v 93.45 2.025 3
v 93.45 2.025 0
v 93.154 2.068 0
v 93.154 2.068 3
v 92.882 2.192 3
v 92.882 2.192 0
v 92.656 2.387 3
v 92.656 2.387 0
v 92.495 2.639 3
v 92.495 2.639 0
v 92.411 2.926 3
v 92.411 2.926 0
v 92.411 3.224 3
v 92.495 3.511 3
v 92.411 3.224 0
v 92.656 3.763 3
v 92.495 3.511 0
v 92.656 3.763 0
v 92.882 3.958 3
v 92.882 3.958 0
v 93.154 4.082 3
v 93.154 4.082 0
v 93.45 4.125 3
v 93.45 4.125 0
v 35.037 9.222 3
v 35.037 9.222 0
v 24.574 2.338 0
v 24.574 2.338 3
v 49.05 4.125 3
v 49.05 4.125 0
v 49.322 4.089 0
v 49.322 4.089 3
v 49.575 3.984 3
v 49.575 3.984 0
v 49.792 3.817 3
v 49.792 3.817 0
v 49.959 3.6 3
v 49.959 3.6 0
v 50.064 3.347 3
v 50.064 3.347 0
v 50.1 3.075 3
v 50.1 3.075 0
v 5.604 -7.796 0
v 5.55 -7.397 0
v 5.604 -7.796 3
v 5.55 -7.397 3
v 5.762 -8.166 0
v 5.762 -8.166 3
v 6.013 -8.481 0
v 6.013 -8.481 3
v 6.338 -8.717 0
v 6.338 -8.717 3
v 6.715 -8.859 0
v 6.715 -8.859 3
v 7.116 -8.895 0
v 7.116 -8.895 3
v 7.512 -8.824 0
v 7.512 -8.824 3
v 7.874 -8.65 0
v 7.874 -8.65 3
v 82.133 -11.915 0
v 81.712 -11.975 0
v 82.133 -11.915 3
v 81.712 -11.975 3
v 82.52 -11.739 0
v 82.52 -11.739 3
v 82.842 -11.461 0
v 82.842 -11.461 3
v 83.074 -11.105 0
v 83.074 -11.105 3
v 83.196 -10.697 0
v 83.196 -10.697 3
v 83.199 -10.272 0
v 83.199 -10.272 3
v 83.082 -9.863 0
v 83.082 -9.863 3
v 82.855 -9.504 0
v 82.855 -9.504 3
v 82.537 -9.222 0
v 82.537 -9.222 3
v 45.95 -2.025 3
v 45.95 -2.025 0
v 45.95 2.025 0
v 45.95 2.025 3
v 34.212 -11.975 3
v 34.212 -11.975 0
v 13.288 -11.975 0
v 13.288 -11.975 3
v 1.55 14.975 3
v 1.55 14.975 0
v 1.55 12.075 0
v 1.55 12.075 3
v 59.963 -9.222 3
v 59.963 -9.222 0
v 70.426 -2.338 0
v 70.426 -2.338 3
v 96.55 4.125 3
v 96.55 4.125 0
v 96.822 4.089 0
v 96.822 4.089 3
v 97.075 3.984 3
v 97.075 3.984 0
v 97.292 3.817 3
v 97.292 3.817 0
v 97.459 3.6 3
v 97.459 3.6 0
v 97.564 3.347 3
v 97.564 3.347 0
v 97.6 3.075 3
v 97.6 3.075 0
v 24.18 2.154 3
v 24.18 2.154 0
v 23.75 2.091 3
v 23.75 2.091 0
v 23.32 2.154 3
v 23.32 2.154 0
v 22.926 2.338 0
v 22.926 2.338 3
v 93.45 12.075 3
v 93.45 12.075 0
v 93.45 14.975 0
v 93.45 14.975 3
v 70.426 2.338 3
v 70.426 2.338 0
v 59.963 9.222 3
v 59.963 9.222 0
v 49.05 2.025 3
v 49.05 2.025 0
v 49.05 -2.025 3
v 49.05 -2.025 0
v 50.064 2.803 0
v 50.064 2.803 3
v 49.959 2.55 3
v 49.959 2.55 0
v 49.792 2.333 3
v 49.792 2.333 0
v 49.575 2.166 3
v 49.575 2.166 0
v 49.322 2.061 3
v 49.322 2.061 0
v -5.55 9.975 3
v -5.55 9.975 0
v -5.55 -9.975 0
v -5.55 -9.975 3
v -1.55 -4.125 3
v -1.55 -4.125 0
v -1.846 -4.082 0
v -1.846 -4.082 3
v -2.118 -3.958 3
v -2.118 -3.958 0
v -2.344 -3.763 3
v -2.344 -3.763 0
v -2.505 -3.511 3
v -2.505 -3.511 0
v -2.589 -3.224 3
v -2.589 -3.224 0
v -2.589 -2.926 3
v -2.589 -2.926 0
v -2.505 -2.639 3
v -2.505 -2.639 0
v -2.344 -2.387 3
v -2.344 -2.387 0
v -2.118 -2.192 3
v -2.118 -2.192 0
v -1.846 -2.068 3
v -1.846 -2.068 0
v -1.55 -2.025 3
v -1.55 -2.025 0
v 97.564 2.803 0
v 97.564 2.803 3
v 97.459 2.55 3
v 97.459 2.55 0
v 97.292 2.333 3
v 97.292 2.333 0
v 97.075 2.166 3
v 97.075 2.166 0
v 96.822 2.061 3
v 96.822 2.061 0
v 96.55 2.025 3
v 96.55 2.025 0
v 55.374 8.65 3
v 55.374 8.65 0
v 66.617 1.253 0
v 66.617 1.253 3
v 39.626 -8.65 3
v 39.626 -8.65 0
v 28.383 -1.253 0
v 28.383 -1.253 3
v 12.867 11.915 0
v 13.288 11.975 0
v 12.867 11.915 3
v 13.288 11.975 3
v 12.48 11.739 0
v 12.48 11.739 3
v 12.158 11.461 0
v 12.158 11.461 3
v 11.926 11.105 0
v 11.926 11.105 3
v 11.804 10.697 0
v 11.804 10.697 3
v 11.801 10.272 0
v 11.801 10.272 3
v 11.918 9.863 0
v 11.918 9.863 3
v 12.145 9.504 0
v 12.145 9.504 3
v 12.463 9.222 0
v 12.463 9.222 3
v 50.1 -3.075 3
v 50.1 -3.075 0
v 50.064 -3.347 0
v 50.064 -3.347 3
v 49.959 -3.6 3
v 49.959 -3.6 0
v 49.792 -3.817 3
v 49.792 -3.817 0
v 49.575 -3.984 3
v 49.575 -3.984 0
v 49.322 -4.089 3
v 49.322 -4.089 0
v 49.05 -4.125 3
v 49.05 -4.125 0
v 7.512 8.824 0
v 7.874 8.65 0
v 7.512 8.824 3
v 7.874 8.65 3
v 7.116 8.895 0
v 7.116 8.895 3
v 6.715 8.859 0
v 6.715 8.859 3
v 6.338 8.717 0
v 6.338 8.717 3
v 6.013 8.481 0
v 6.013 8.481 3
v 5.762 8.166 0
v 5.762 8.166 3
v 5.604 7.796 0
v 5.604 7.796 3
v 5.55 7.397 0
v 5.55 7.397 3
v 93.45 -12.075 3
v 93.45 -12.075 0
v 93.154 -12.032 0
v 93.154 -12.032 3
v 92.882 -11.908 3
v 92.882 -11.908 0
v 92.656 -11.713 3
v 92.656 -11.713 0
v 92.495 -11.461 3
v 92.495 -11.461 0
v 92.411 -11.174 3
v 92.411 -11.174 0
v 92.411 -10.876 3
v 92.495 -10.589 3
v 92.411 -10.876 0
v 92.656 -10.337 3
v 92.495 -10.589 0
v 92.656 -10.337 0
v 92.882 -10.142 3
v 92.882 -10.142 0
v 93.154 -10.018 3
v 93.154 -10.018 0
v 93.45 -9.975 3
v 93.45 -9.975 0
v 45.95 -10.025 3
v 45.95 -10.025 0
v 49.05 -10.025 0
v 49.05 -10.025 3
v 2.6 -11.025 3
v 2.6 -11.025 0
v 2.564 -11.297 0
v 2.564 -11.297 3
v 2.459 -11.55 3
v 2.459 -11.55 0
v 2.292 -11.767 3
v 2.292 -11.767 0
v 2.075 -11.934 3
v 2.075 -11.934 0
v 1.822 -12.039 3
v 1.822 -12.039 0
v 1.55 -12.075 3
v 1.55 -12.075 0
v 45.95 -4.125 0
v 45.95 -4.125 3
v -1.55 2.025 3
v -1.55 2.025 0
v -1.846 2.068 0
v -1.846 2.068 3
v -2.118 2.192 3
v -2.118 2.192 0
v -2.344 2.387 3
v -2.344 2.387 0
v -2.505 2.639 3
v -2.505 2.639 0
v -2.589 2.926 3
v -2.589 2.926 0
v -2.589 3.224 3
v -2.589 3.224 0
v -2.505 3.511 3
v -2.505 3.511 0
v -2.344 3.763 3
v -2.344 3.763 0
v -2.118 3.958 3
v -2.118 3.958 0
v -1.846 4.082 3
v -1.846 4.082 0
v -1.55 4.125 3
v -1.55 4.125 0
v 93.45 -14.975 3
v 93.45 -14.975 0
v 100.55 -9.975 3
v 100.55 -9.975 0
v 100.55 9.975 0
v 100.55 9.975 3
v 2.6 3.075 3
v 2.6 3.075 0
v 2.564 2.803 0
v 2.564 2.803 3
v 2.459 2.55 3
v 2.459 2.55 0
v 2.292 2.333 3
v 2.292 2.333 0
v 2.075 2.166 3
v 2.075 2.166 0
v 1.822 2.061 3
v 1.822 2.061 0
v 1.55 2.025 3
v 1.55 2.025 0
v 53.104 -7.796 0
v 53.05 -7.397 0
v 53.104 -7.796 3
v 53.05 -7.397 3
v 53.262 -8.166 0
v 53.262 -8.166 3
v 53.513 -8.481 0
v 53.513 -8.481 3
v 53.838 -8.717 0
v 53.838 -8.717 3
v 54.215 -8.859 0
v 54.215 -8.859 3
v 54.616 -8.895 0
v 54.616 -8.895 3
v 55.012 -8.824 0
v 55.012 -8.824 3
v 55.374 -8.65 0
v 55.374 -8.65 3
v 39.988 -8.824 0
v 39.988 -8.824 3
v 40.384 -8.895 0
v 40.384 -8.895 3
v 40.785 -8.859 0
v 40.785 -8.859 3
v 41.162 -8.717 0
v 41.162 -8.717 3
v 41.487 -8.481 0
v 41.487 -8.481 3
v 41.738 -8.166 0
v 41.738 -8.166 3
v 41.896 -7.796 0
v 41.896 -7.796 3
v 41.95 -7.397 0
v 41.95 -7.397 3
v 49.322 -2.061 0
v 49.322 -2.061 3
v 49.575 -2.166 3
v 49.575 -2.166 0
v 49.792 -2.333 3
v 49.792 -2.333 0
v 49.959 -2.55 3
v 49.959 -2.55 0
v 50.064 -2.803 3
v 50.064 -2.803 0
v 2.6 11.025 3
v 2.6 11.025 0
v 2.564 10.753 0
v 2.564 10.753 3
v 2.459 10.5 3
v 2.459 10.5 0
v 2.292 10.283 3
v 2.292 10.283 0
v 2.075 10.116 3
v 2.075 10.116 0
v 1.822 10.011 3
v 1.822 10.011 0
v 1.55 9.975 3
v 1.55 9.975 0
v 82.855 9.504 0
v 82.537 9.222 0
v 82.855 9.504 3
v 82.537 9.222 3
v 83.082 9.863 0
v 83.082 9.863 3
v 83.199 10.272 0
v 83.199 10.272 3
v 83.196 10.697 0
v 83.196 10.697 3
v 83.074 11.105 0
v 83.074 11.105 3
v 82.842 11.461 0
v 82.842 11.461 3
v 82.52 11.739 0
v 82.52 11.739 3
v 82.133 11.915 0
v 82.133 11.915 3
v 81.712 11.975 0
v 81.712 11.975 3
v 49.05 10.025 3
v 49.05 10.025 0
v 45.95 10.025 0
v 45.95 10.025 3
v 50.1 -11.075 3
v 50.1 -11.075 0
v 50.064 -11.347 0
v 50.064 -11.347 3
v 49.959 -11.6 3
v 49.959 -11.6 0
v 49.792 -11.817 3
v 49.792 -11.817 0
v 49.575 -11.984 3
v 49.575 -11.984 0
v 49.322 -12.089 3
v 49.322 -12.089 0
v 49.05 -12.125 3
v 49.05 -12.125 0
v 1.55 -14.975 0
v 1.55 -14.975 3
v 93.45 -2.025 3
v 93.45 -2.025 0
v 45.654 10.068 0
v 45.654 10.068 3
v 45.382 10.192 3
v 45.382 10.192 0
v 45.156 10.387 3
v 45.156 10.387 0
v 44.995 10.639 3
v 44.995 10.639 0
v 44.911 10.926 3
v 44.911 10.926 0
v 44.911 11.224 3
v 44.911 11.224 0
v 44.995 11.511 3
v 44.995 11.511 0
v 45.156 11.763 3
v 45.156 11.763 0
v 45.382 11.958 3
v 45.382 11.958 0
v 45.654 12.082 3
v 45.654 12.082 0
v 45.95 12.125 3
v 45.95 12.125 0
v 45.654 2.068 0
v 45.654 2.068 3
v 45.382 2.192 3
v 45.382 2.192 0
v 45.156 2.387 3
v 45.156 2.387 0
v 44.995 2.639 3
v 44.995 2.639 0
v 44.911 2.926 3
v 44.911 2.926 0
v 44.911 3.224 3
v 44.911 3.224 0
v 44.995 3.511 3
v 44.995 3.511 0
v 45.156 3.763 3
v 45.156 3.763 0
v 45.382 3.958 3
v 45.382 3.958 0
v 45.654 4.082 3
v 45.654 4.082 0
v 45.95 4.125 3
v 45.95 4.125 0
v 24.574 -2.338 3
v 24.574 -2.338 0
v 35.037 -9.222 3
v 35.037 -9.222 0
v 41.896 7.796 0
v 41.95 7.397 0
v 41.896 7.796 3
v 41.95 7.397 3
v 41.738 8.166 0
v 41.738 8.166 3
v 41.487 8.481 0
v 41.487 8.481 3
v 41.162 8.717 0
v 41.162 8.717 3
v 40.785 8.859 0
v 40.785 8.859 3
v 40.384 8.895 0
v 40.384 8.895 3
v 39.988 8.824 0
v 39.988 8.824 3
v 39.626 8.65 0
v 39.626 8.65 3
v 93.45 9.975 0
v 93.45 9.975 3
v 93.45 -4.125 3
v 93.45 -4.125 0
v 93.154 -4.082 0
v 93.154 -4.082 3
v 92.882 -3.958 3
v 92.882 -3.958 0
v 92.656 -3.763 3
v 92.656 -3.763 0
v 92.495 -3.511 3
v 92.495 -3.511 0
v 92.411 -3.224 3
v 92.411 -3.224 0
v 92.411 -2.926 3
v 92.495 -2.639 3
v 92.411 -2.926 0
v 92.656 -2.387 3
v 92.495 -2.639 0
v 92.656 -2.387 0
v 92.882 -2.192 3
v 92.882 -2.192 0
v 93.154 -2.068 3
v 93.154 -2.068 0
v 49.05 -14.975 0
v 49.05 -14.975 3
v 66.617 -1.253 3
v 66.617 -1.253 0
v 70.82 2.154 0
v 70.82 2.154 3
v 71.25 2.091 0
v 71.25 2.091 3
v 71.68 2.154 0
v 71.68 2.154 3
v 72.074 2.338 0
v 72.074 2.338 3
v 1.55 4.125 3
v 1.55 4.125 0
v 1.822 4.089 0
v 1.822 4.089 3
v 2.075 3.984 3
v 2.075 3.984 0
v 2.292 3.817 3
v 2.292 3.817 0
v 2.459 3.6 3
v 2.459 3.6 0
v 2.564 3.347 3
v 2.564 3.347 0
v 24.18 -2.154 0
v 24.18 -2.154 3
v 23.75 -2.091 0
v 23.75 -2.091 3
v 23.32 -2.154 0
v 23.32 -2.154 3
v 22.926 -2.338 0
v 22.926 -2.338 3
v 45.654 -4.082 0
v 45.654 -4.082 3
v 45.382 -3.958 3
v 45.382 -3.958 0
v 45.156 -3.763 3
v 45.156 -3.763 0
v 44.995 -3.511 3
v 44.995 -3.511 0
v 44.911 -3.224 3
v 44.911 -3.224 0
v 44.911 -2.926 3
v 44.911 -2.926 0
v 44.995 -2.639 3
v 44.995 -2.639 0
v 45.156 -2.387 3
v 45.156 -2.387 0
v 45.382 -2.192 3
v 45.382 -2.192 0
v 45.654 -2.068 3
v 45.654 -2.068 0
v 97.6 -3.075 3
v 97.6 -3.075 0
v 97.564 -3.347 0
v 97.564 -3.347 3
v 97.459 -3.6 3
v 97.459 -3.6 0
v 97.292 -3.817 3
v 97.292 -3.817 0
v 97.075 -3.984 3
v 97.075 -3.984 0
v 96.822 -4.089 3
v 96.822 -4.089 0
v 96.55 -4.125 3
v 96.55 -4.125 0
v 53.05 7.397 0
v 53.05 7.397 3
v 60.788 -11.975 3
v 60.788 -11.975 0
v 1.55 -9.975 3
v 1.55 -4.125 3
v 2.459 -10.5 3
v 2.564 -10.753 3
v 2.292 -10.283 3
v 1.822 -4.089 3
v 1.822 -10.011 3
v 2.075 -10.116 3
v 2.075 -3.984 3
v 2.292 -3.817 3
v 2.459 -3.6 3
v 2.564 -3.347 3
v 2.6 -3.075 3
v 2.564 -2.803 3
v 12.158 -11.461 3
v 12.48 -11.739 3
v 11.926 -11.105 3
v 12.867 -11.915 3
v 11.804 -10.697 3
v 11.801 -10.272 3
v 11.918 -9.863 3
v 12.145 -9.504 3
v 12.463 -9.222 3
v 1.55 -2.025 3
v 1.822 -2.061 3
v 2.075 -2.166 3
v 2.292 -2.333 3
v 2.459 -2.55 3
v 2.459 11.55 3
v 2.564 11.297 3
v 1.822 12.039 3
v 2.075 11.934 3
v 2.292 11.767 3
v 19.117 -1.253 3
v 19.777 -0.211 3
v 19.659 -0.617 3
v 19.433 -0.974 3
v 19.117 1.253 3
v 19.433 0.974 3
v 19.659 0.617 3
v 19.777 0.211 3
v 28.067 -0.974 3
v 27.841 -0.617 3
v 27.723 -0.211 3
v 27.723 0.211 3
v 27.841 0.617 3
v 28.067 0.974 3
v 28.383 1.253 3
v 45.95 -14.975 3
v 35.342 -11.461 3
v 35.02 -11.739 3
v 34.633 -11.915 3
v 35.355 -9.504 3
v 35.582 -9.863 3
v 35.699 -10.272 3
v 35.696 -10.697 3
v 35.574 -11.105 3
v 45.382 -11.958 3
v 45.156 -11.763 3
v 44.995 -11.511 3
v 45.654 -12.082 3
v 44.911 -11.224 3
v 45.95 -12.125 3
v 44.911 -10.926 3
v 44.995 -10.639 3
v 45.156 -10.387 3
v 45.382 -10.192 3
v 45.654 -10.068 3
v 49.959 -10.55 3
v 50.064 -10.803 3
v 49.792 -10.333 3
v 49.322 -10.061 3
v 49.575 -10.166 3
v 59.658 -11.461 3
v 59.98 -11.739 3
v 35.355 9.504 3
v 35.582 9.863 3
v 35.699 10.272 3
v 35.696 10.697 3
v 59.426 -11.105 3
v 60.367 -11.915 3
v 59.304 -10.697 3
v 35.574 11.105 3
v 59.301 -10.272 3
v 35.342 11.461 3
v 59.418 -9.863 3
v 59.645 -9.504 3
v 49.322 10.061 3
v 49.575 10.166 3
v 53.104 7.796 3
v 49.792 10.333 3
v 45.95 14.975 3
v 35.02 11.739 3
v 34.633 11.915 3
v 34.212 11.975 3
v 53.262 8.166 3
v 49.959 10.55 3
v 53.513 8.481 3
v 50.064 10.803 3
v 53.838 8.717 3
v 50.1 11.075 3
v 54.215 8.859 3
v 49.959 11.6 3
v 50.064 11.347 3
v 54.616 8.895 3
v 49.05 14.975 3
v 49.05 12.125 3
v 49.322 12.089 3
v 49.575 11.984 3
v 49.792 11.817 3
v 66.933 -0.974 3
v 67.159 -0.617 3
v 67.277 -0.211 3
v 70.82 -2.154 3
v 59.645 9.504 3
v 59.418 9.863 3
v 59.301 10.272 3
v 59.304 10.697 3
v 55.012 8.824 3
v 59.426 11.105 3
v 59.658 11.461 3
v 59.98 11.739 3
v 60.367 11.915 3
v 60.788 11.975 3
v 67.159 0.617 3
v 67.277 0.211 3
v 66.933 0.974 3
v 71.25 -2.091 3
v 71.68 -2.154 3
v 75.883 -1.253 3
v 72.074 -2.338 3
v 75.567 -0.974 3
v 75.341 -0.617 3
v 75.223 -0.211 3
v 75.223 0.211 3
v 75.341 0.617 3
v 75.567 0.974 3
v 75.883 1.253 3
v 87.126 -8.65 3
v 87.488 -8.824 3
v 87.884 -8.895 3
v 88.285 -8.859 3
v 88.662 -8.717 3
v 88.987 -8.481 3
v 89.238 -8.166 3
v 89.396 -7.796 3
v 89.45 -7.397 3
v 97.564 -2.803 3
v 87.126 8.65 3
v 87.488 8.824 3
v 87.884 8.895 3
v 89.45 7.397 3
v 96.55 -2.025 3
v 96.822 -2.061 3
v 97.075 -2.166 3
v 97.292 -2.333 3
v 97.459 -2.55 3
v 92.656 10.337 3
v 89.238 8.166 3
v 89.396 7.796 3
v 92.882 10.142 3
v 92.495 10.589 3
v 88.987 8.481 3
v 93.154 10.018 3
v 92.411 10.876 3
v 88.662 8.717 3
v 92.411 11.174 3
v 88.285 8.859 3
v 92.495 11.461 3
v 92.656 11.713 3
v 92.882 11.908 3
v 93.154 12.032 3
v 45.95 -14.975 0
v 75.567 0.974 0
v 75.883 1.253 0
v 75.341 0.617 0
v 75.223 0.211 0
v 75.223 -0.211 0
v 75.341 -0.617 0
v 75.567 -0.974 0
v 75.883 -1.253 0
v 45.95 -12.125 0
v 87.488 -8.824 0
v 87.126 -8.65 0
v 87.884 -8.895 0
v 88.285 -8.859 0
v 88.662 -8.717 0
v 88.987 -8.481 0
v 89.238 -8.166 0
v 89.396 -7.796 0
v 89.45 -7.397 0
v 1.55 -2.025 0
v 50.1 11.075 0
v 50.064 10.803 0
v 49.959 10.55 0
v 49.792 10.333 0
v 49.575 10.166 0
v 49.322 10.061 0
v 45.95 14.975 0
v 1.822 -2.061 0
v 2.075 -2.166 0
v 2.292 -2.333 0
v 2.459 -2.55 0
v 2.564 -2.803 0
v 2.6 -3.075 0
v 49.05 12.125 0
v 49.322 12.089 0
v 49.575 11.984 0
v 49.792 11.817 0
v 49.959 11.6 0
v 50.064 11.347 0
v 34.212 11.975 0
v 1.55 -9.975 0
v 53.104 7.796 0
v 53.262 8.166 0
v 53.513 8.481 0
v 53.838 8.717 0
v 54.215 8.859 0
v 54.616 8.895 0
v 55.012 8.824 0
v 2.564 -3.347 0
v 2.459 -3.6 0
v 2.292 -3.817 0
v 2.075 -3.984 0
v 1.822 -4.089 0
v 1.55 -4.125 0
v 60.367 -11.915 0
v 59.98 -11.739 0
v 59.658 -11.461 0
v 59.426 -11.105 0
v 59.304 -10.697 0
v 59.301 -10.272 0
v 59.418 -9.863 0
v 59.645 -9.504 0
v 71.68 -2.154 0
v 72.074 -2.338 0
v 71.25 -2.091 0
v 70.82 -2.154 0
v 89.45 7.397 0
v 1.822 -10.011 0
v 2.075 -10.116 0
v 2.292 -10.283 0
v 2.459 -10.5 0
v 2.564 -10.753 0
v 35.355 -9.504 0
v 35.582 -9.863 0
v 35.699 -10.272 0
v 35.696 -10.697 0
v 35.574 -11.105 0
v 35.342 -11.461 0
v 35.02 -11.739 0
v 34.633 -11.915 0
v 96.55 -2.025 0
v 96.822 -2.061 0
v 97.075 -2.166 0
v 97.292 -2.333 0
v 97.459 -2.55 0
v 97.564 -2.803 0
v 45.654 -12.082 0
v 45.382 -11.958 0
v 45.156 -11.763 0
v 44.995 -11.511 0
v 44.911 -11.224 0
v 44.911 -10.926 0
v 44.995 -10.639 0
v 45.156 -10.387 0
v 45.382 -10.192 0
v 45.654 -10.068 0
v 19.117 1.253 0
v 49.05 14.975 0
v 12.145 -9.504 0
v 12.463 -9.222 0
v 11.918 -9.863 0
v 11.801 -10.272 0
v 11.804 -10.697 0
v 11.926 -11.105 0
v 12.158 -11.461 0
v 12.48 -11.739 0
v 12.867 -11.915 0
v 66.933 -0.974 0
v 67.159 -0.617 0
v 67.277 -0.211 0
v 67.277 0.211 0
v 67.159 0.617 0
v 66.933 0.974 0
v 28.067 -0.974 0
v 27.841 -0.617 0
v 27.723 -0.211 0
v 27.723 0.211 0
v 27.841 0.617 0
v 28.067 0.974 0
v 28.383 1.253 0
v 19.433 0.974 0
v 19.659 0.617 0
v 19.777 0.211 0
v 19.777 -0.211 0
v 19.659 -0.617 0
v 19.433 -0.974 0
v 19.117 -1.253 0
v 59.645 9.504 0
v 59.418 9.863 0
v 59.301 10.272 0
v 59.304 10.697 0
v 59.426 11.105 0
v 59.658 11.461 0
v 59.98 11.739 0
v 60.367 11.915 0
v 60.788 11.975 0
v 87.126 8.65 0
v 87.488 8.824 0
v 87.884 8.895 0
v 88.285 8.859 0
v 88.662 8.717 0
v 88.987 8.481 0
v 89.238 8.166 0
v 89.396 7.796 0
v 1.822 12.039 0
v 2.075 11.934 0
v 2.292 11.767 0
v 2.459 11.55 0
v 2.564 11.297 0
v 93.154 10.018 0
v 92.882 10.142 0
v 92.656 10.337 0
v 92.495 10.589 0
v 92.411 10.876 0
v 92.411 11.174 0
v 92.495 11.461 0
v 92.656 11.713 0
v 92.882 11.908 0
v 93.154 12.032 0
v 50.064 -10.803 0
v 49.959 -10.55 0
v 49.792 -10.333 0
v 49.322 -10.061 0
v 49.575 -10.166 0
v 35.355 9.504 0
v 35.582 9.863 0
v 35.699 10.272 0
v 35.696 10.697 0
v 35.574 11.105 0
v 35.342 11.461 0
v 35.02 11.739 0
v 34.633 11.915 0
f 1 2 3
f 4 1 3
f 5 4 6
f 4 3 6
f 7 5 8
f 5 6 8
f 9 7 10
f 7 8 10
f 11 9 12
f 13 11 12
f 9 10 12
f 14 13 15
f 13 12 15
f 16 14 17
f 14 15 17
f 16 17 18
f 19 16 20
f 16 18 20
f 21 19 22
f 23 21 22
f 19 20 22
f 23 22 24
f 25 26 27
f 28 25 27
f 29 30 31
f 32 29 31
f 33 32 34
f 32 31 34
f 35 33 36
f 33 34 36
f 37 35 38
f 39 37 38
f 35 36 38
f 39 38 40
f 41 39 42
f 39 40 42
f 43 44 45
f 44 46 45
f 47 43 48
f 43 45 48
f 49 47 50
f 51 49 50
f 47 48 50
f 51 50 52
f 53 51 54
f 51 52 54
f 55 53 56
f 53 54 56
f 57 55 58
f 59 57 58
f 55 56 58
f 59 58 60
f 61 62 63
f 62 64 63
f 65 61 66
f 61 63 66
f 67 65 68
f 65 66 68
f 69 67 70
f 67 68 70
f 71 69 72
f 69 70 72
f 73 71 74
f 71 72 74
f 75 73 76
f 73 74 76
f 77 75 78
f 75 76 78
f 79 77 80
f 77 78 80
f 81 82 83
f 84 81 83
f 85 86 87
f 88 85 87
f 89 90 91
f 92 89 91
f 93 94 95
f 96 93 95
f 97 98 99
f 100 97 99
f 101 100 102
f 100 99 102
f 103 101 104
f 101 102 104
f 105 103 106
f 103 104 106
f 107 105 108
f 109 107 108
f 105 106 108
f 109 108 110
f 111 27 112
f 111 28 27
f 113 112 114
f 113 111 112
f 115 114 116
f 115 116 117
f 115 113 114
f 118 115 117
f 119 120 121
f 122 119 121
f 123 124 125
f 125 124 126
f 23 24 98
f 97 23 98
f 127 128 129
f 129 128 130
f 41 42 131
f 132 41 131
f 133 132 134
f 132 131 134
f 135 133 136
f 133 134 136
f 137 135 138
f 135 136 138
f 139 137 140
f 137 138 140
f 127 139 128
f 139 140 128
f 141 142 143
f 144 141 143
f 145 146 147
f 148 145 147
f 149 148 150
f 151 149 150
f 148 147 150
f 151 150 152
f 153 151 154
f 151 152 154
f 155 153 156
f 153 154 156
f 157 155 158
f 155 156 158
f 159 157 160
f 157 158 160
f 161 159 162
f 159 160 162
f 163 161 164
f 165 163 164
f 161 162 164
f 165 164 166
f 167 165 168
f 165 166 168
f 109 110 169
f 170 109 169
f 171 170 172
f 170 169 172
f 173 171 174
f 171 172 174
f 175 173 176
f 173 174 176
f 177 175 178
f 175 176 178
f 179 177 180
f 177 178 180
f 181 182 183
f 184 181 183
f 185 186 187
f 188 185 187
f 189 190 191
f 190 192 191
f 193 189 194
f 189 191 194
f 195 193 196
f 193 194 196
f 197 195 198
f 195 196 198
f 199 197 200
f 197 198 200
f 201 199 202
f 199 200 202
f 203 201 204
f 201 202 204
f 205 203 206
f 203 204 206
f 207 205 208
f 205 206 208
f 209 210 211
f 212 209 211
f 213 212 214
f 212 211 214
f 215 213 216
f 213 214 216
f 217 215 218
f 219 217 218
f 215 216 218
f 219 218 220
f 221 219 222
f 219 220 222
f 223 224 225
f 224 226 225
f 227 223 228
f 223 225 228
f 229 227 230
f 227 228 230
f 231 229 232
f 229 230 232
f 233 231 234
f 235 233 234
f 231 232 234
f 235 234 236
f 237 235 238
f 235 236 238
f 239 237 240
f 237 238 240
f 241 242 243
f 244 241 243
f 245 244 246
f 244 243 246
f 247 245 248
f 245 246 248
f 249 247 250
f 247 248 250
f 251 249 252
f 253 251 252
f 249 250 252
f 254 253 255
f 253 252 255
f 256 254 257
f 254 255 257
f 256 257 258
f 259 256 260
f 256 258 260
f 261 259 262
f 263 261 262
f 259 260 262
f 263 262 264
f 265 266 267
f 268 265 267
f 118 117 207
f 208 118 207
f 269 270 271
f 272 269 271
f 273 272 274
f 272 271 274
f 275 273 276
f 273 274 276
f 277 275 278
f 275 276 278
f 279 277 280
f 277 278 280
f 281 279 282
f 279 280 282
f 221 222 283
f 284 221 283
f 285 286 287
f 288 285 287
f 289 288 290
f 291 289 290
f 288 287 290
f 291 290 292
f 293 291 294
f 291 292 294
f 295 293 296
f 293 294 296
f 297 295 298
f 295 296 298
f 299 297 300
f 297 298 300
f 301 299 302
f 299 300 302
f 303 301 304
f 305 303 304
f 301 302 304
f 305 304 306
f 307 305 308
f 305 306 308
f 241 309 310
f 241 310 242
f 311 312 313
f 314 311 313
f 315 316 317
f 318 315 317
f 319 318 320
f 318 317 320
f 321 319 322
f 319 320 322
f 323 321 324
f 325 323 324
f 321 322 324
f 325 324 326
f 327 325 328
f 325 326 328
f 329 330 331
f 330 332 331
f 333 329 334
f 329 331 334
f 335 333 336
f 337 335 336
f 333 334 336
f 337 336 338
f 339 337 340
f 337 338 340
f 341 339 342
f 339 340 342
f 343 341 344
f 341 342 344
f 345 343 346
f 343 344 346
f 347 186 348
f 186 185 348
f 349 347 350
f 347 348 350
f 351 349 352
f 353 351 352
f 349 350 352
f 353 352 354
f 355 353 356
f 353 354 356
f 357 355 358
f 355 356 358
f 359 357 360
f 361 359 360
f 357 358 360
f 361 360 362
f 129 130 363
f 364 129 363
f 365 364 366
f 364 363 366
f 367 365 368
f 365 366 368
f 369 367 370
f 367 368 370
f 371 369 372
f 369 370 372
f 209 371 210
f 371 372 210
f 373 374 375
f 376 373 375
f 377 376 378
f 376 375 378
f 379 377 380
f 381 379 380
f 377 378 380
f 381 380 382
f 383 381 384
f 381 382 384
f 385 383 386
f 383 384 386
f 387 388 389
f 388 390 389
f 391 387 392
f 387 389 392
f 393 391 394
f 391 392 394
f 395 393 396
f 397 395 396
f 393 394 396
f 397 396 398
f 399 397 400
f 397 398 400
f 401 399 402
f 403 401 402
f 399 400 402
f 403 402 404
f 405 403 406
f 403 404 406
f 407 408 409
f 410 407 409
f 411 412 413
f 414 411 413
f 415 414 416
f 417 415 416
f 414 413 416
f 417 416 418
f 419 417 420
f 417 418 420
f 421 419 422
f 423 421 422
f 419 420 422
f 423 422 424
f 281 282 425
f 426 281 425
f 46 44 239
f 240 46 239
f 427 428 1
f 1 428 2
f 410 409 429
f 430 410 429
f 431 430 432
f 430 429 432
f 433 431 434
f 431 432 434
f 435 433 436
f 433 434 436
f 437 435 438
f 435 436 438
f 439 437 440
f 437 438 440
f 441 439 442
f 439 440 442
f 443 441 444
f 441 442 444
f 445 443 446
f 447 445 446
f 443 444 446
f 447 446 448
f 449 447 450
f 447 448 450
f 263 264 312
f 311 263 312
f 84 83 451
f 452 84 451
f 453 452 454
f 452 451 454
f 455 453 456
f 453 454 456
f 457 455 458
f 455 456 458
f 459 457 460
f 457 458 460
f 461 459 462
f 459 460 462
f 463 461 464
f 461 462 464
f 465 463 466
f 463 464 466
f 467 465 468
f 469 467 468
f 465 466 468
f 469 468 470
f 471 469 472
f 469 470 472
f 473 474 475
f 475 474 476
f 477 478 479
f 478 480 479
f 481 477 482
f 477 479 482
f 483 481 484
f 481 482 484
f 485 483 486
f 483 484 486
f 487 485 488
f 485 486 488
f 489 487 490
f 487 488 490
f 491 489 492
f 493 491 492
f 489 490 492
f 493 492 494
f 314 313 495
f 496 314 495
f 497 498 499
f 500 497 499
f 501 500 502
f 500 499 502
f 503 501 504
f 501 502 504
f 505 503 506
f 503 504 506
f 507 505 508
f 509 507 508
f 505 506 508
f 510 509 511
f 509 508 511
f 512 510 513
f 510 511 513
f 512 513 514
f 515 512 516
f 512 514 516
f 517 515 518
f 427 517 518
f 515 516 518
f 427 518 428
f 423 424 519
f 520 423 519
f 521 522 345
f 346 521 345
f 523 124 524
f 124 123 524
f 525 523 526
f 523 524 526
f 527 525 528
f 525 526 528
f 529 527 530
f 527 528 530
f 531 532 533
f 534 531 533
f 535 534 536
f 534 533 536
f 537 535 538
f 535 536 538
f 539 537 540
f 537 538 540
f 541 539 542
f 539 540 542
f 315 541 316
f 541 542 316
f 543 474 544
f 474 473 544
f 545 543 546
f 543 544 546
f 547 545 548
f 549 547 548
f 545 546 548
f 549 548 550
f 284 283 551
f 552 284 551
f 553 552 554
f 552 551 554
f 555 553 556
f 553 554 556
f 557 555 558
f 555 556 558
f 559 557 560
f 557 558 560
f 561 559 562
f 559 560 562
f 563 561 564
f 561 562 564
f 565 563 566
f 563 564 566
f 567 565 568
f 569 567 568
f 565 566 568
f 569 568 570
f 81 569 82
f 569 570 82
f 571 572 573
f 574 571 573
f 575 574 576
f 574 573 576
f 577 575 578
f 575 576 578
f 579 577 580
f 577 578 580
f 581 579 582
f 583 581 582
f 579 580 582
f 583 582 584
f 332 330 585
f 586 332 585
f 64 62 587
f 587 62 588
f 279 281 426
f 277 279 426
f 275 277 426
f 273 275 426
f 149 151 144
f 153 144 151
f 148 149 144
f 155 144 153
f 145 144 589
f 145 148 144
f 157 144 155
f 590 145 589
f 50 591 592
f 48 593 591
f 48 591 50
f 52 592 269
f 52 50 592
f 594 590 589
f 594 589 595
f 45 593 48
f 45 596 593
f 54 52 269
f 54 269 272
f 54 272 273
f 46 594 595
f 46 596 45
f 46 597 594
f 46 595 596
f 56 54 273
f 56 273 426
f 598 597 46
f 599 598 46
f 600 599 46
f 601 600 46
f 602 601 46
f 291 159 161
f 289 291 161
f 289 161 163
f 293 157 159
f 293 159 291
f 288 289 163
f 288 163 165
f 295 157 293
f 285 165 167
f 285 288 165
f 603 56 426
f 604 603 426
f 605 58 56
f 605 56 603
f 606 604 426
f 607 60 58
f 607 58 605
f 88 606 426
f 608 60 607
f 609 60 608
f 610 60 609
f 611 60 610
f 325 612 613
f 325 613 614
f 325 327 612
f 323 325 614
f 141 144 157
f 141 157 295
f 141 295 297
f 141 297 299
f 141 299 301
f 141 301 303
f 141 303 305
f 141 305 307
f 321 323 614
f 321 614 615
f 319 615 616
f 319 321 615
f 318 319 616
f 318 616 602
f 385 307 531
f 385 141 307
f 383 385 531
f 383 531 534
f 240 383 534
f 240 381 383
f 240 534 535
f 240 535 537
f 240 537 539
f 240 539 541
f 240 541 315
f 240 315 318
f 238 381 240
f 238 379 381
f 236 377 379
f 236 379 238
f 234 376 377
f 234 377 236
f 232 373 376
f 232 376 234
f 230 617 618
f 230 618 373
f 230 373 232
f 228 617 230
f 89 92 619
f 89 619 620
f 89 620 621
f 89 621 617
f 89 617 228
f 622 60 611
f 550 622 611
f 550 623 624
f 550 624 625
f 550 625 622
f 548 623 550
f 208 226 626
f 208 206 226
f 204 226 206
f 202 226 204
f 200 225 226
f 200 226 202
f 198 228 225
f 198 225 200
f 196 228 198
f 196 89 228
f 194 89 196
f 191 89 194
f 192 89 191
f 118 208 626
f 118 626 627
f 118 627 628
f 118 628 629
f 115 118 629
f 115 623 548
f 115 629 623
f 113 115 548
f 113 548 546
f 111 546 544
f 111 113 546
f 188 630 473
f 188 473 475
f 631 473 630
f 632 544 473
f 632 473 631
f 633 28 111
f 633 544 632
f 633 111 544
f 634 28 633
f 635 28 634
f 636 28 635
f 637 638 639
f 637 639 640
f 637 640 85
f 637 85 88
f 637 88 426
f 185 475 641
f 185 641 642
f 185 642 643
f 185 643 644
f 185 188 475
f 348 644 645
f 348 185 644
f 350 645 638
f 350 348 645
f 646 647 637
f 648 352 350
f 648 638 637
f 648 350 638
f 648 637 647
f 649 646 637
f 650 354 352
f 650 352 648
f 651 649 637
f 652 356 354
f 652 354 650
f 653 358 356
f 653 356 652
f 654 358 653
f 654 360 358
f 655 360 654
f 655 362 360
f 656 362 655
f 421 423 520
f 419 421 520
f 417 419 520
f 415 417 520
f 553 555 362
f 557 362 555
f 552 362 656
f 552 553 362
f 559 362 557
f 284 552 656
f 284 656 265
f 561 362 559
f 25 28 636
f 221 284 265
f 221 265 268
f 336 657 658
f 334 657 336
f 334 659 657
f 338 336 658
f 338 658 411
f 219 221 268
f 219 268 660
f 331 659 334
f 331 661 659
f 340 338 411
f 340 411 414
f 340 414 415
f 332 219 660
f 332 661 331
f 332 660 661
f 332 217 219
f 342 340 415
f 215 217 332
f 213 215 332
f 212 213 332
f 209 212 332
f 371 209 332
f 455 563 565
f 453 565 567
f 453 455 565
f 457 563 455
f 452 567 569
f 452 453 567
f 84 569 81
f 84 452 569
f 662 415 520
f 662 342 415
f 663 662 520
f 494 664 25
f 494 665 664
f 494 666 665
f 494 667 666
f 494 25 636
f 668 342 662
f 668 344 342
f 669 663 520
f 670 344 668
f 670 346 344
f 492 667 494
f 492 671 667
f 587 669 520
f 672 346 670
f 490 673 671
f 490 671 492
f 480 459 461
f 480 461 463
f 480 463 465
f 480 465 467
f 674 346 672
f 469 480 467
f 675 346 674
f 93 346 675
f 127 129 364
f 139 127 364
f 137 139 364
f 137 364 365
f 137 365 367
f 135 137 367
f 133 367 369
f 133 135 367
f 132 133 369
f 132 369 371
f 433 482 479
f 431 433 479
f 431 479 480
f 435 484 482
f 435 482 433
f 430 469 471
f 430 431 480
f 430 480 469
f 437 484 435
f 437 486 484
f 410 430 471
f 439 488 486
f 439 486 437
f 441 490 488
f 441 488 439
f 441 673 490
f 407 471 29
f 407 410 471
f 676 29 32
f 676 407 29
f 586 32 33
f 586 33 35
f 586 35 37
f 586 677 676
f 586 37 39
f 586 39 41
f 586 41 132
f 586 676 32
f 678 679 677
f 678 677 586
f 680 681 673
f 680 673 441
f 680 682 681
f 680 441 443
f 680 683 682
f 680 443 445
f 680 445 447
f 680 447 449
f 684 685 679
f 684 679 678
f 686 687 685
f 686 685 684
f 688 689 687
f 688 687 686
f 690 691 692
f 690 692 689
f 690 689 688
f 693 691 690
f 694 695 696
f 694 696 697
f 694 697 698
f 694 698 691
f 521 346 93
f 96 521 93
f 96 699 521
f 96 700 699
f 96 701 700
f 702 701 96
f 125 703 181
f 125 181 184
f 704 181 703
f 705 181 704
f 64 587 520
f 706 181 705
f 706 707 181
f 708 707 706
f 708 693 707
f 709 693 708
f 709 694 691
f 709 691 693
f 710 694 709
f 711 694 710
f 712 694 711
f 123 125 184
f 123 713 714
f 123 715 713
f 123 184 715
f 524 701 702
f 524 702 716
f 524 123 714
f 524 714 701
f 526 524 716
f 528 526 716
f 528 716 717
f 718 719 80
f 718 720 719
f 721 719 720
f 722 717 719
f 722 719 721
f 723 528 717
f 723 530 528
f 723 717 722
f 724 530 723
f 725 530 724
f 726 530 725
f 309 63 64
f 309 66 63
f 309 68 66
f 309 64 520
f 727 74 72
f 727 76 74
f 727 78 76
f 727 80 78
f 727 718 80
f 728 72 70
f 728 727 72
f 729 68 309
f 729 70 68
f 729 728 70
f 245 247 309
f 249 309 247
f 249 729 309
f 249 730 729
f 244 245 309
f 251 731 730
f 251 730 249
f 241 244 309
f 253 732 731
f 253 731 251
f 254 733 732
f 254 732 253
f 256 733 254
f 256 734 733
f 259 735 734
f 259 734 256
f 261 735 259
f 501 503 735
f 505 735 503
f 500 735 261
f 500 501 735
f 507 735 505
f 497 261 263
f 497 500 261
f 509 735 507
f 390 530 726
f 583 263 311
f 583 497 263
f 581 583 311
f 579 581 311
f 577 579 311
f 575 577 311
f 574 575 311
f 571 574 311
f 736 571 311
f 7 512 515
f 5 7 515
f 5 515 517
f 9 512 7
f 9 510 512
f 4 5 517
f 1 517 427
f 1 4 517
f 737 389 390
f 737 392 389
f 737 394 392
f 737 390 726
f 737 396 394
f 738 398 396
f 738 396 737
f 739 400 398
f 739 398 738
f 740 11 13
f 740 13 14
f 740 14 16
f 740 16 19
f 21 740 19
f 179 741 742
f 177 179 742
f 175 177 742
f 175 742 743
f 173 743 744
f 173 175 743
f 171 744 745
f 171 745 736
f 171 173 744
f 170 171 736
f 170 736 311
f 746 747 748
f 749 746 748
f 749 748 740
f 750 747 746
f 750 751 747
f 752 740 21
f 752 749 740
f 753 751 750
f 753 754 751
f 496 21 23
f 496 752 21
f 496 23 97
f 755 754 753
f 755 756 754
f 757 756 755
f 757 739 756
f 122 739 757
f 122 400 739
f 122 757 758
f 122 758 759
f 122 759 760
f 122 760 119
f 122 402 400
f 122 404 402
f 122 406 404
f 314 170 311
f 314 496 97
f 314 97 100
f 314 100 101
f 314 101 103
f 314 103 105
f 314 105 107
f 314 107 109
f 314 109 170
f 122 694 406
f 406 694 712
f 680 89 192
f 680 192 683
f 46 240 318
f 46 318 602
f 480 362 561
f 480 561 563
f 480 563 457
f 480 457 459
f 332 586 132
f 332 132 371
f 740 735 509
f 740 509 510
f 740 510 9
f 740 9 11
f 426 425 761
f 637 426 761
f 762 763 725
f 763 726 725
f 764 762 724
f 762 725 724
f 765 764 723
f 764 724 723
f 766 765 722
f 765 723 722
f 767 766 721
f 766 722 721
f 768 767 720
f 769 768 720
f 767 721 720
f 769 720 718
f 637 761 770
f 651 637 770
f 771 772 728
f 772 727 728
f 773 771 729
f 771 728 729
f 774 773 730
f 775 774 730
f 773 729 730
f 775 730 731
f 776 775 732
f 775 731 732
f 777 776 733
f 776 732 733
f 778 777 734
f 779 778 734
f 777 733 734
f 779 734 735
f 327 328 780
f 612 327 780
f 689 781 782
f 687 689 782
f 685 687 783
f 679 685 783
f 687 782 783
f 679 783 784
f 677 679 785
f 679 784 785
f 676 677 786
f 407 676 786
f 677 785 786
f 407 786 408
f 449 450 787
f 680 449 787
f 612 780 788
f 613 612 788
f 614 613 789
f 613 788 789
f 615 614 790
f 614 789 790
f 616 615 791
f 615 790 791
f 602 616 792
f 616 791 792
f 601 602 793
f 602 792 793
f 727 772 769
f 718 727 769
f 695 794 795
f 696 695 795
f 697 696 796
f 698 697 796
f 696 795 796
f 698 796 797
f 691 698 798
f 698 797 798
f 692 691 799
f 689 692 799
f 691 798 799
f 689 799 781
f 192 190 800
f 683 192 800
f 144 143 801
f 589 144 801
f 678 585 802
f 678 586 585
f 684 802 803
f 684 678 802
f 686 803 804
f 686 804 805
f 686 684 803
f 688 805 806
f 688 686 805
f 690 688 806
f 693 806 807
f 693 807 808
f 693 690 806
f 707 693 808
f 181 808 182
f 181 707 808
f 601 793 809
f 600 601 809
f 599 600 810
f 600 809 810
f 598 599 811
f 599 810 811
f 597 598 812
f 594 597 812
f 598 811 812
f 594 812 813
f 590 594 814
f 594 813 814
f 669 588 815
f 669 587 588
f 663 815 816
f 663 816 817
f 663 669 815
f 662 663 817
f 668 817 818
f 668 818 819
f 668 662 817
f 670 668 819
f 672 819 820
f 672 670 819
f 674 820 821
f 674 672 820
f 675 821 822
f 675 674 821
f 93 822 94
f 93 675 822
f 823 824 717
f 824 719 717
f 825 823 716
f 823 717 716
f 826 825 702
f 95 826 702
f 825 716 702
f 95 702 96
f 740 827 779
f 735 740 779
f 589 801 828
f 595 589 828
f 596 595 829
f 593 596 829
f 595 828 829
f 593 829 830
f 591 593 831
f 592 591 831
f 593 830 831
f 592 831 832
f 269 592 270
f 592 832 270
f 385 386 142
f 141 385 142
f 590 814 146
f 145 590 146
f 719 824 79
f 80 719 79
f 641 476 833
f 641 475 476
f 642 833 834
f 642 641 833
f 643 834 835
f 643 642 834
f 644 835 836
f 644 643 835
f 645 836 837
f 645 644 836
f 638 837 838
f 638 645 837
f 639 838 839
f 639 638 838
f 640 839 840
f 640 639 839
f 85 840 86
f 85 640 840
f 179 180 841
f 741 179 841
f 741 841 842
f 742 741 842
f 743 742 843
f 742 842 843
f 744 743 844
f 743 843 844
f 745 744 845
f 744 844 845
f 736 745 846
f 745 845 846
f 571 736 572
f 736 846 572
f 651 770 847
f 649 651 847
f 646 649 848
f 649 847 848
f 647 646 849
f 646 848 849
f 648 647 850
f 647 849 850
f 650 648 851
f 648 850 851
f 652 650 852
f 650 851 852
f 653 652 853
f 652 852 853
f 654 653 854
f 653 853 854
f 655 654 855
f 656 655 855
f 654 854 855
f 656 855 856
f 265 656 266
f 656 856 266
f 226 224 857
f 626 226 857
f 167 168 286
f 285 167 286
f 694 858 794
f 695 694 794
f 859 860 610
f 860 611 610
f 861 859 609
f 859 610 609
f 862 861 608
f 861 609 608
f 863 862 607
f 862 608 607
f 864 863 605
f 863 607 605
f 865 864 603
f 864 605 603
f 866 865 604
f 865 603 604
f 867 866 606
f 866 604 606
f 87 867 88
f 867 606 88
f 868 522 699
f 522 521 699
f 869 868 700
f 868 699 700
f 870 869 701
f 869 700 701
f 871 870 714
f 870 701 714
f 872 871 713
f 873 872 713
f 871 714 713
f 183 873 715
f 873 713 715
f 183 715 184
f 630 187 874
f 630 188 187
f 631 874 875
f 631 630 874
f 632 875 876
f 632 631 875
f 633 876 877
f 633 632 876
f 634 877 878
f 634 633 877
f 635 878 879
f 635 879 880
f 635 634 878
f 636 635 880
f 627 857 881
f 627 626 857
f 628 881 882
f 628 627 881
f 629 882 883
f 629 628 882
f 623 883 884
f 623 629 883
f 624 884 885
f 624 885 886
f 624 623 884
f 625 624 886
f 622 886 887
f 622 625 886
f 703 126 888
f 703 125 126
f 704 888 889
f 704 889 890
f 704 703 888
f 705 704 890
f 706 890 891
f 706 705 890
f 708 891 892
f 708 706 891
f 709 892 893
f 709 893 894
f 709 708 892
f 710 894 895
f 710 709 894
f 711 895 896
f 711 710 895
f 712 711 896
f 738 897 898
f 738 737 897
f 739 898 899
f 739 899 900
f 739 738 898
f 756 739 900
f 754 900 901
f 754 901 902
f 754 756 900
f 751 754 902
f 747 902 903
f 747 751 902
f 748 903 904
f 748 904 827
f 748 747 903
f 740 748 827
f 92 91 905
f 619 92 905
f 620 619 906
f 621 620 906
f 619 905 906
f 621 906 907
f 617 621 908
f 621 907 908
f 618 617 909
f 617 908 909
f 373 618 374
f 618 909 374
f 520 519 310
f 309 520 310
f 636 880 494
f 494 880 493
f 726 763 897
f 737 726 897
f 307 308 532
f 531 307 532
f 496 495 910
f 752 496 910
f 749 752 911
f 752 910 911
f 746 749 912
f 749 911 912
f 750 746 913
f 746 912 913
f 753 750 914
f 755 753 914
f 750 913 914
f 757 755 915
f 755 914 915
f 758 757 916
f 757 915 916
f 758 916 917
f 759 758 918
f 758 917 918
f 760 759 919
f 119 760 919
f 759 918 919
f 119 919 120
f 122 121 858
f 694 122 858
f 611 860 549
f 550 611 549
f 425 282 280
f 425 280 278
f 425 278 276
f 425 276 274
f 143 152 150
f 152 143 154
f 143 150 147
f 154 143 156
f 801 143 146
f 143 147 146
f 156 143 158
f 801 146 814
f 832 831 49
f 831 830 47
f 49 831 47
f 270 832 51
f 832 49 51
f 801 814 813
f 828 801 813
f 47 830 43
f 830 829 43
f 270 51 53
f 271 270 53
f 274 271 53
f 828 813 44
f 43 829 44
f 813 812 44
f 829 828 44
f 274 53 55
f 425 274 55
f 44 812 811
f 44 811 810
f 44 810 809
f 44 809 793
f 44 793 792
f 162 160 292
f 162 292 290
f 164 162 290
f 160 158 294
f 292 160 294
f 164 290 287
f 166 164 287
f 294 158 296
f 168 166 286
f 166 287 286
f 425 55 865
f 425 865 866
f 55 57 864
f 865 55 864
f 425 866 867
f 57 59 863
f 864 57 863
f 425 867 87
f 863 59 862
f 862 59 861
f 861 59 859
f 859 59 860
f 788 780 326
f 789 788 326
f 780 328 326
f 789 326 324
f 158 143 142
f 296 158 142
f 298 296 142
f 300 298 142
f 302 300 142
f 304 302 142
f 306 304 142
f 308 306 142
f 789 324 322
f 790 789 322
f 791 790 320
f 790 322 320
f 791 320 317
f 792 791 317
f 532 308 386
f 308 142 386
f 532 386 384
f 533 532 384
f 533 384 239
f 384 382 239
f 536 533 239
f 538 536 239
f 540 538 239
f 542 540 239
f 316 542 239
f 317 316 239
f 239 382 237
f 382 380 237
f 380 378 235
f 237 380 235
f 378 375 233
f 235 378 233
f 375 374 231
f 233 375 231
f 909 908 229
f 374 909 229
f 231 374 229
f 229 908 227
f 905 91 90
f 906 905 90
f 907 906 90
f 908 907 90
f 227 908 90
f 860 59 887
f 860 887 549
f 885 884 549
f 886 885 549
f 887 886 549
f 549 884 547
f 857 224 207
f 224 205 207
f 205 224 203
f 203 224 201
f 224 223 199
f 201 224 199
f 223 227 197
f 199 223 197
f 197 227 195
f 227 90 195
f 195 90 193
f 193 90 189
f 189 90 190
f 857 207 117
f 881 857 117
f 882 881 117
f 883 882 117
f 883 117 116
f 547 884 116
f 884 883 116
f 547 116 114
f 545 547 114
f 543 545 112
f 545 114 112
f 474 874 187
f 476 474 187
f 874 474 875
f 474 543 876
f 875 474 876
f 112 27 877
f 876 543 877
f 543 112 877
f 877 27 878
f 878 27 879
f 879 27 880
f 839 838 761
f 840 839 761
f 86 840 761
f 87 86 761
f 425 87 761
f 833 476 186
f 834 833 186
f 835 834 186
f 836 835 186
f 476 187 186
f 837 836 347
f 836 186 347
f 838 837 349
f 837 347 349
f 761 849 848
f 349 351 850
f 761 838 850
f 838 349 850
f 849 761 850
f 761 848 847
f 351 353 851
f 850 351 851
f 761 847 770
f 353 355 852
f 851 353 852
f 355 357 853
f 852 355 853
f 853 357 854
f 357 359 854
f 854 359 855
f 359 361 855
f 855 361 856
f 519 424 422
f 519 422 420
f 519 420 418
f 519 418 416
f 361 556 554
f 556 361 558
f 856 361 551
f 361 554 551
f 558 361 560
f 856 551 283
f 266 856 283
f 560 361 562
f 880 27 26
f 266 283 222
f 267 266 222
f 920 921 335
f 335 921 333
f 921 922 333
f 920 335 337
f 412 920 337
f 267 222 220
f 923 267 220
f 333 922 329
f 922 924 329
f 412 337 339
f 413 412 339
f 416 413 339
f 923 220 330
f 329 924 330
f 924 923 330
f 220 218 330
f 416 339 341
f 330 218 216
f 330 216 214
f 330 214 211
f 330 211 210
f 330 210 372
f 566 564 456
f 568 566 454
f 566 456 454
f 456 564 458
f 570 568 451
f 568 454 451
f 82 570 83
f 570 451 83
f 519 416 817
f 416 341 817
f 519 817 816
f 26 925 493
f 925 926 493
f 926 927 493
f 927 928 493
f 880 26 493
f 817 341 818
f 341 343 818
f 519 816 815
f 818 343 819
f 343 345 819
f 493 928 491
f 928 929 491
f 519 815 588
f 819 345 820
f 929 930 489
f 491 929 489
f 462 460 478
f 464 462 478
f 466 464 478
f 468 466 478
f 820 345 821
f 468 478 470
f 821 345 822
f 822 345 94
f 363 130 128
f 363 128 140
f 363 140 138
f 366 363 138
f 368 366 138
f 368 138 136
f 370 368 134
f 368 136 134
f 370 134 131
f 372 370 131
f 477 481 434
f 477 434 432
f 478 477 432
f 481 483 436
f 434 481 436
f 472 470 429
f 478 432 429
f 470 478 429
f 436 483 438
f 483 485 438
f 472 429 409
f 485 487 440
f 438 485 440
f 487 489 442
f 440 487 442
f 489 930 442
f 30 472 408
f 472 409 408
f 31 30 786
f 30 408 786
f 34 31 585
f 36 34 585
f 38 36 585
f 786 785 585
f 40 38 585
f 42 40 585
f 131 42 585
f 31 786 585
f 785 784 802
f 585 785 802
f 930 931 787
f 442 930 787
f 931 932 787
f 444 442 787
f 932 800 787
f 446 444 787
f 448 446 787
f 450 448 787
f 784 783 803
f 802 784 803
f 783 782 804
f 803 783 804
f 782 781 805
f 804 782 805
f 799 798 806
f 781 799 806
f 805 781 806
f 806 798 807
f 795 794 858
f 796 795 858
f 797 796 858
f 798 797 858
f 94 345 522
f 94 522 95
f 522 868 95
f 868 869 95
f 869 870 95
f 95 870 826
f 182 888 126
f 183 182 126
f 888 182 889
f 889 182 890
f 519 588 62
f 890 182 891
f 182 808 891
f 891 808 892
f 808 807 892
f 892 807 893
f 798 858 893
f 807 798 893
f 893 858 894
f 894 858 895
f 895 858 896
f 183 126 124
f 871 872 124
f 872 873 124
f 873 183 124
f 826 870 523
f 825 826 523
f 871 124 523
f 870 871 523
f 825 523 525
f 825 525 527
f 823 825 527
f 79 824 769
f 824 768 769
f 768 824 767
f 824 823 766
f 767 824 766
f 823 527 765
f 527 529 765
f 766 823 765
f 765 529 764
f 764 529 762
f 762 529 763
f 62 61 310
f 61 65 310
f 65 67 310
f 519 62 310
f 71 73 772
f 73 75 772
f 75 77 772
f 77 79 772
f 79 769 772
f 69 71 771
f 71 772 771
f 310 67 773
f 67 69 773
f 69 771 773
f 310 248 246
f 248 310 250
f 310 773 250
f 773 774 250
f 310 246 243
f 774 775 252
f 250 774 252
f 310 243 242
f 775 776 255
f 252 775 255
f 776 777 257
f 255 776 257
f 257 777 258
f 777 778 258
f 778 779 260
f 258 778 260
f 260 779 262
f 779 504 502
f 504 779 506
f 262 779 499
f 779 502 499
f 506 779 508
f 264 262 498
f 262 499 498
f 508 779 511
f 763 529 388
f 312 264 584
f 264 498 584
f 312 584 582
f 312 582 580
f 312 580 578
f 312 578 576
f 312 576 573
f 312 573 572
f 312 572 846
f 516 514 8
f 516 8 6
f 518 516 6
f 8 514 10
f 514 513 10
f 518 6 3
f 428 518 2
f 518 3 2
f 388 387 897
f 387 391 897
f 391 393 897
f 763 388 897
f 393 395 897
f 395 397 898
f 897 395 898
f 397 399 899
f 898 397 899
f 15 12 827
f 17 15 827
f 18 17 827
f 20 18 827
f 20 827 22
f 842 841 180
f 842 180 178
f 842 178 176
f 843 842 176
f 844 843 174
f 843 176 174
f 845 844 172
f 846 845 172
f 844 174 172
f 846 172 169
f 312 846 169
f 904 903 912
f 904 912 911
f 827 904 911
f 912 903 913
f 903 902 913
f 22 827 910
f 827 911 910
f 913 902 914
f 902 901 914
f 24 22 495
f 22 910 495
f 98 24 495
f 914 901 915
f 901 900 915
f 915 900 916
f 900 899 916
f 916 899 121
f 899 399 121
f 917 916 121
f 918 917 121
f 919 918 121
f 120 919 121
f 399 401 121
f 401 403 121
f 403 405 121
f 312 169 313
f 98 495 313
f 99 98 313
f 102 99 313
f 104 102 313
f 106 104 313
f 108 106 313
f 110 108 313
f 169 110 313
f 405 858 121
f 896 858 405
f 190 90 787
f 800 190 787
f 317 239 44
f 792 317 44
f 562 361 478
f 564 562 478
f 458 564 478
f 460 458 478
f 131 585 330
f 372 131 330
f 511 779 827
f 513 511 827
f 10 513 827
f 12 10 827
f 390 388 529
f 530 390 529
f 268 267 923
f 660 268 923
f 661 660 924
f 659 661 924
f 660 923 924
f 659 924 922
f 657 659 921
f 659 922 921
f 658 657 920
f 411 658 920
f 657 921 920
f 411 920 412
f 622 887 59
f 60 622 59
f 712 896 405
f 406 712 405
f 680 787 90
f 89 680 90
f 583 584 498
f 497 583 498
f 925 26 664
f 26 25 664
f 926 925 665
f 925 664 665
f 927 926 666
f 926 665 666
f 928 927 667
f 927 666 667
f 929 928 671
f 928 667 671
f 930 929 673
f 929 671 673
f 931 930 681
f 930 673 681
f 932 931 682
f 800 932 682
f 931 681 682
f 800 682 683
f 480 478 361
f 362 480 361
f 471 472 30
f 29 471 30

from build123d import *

# Parameters (mm, degrees)
EXTRUDE_1_DEPTH = 3
FILLET_1_R      = 1.5


with BuildPart() as part:
    # 草图1 → 凸台-拉伸1 (new body)
    with BuildSketch(Plane.XY):
        with BuildLine():
            Line((100.55, -9.975), (100.55, 9.975))
            Line((100.55, 9.975), (93.45, 9.975))
            ThreePointArc((93.45, 9.975), (92.4, 11.025), (93.45, 12.075))
            Line((93.45, 12.075), (93.45, 14.975))
            Line((93.45, 14.975), (49.05, 14.975))
            Line((49.05, 14.975), (49.05, 12.125))
            ThreePointArc((49.05, 12.125), (49.79246212, 11.81746212), (50.1, 11.075))
            ThreePointArc((50.1, 11.075), (49.79246212, 10.33253788), (49.05, 10.025))
            Line((49.05, 10.025), (45.95, 10.025))
            ThreePointArc((45.95, 10.025), (44.9, 11.075), (45.95, 12.125))
            Line((45.95, 12.125), (45.95, 14.975))
            Line((45.95, 14.975), (1.55, 14.975))
            Line((1.55, 14.975), (1.55, 12.075))
            ThreePointArc((1.55, 12.075), (2.29246212, 11.76746212), (2.6, 11.025))
            ThreePointArc((2.6, 11.025), (2.29246212, 10.28253788), (1.55, 9.975))
            Line((1.55, 9.975), (-5.55, 9.975))
            Line((-5.55, 9.975), (-5.55, -9.975))
            Line((-5.55, -9.975), (1.55, -9.975))
            ThreePointArc((1.55, -9.975), (2.29246212, -10.28253788), (2.6, -11.025))
            ThreePointArc((2.6, -11.025), (2.29246212, -11.76746212), (1.55, -12.075))
            Line((1.55, -12.075), (1.55, -14.975))
            Line((1.55, -14.975), (45.95, -14.975))
            Line((45.95, -14.975), (45.95, -12.125))
            ThreePointArc((45.95, -12.125), (44.9, -11.075), (45.95, -10.025))
            Line((45.95, -10.025), (49.05, -10.025))
            ThreePointArc((49.05, -10.025), (49.79246212, -10.33253788), (50.1, -11.075))
            ThreePointArc((50.1, -11.075), (49.79246212, -11.81746212), (49.05, -12.125))
            Line((49.05, -12.125), (49.05, -14.975))
            Line((49.05, -14.975), (93.45, -14.975))
            Line((93.45, -14.975), (93.45, -12.075))
            ThreePointArc((93.45, -12.075), (92.4, -11.025), (93.45, -9.975))
            Line((93.45, -9.975), (100.55, -9.975))
        make_face()
        with BuildLine():
            ThreePointArc((2.6, -3.075), (2.29246212, -3.81746212), (1.55, -4.125))
            Line((1.55, -4.125), (-1.55, -4.125))
            ThreePointArc((-1.55, -4.125), (-2.6, -3.075), (-1.55, -2.025))
            Line((-1.55, -2.025), (-1.55, 2.025))
            ThreePointArc((-1.55, 2.025), (-2.6, 3.075), (-1.55, 4.125))
            Line((-1.55, 4.125), (1.55, 4.125))
            ThreePointArc((1.55, 4.125), (2.29246212, 3.81746212), (2.6, 3.075))
            ThreePointArc((2.6, 3.075), (2.29246212, 2.33253788), (1.55, 2.025))
            Line((1.55, 2.025), (1.55, -2.025))
            ThreePointArc((1.55, -2.025), (2.29246212, -2.33253788), (2.6, -3.075))
        make_face(mode=Mode.SUBTRACT)
        Polygon((39.221033587, -11.975), (8.278966413, -11.975), (23.75, -1.795569934), align=None, mode=Mode.SUBTRACT)
        Polygon((26.478966413, 0), (41.95, 10.179430066), (41.95, -10.179430066), align=None, mode=Mode.SUBTRACT)
        with BuildLine():
            ThreePointArc((50.1, -3.075), (49.79246212, -3.81746212), (49.05, -4.125))
            Line((49.05, -4.125), (45.95, -4.125))
            ThreePointArc((45.95, -4.125), (44.9, -3.075), (45.95, -2.025))
            Line((45.95, -2.025), (45.95, 2.025))
            ThreePointArc((45.95, 2.025), (44.9, 3.075), (45.95, 4.125))
            Line((45.95, 4.125), (49.05, 4.125))
            ThreePointArc((49.05, 4.125), (49.79246212, 3.81746212), (50.1, 3.075))
            ThreePointArc((50.1, 3.075), (49.79246212, 2.33253788), (49.05, 2.025))
            Line((49.05, 2.025), (49.05, -2.025))
            ThreePointArc((49.05, -2.025), (49.79246212, -2.33253788), (50.1, -3.075))
        make_face(mode=Mode.SUBTRACT)
        Polygon((55.778966413, -11.975), (71.25, -1.795569934), (86.721033587, -11.975), align=None, mode=Mode.SUBTRACT)
        Polygon((53.05, 10.179430066), (68.521033587, 0), (53.05, -10.179430066), align=None, mode=Mode.SUBTRACT)
        with BuildLine():
            ThreePointArc((97.6, -3.075), (97.29246212, -3.81746212), (96.55, -4.125))
            Line((96.55, -4.125), (93.45, -4.125))
            ThreePointArc((93.45, -4.125), (92.4, -3.075), (93.45, -2.025))
            Line((93.45, -2.025), (93.45, 2.025))
            ThreePointArc((93.45, 2.025), (92.4, 3.075), (93.45, 4.125))
            Line((93.45, 4.125), (96.55, 4.125))
            ThreePointArc((96.55, 4.125), (97.29246212, 3.81746212), (97.6, 3.075))
            ThreePointArc((97.6, 3.075), (97.29246212, 2.33253788), (96.55, 2.025))
            Line((96.55, 2.025), (96.55, -2.025))
            ThreePointArc((96.55, -2.025), (97.29246212, -2.33253788), (97.6, -3.075))
        make_face(mode=Mode.SUBTRACT)
        Polygon((21.021033587, 0), (5.55, -10.179430066), (5.55, 10.179430066), align=None, mode=Mode.SUBTRACT)
        Polygon((23.75, 1.795569934), (8.278966413, 11.975), (39.221033587, 11.975), align=None, mode=Mode.SUBTRACT)
        Polygon((55.778966413, 11.975), (86.721033587, 11.975), (71.25, 1.795569934), align=None, mode=Mode.SUBTRACT)
        Polygon((89.45, 10.179430066), (89.45, -10.179430066), (73.978966413, 0), align=None, mode=Mode.SUBTRACT)
    extrude(amount=EXTRUDE_1_DEPTH)

    # 圆角1
    fillet_1_edges = [part.edges().sort_by_distance(p)[0] for p in [
        (55.778966413, 11.975, 1.5),
        (71.25, 1.795569934, 1.5),
        (86.721033587, 11.975, 1.5),
        (8.278966413, -11.975, 1.5),
        (39.221033587, -11.975, 1.5),
        (23.75, -1.795569934, 1.5),
        (41.95, -10.179430066, 1.5),
        (41.95, 10.179430066, 1.5),
        (26.478966413, 0, 1.5),
        (21.021033587, 0, 1.5),
        (5.55, 10.179430066, 1.5),
        (5.55, -10.179430066, 1.5),
        (39.221033587, 11.975, 1.5),
        (8.278966413, 11.975, 1.5),
        (23.75, 1.795569934, 1.5),
        (53.05, -10.179430066, 1.5),
        (68.521033587, 0, 1.5),
        (53.05, 10.179430066, 1.5),
        (86.721033587, -11.975, 1.5),
        (71.25, -1.795569934, 1.5),
        (55.778966413, -11.975, 1.5),
        (73.978966413, 0, 1.5),
        (89.45, -10.179430066, 1.5),
        (89.45, 10.179430066, 1.5),
    ]]
    fillet(fillet_1_edges, radius=FILLET_1_R)


solid = part.part
